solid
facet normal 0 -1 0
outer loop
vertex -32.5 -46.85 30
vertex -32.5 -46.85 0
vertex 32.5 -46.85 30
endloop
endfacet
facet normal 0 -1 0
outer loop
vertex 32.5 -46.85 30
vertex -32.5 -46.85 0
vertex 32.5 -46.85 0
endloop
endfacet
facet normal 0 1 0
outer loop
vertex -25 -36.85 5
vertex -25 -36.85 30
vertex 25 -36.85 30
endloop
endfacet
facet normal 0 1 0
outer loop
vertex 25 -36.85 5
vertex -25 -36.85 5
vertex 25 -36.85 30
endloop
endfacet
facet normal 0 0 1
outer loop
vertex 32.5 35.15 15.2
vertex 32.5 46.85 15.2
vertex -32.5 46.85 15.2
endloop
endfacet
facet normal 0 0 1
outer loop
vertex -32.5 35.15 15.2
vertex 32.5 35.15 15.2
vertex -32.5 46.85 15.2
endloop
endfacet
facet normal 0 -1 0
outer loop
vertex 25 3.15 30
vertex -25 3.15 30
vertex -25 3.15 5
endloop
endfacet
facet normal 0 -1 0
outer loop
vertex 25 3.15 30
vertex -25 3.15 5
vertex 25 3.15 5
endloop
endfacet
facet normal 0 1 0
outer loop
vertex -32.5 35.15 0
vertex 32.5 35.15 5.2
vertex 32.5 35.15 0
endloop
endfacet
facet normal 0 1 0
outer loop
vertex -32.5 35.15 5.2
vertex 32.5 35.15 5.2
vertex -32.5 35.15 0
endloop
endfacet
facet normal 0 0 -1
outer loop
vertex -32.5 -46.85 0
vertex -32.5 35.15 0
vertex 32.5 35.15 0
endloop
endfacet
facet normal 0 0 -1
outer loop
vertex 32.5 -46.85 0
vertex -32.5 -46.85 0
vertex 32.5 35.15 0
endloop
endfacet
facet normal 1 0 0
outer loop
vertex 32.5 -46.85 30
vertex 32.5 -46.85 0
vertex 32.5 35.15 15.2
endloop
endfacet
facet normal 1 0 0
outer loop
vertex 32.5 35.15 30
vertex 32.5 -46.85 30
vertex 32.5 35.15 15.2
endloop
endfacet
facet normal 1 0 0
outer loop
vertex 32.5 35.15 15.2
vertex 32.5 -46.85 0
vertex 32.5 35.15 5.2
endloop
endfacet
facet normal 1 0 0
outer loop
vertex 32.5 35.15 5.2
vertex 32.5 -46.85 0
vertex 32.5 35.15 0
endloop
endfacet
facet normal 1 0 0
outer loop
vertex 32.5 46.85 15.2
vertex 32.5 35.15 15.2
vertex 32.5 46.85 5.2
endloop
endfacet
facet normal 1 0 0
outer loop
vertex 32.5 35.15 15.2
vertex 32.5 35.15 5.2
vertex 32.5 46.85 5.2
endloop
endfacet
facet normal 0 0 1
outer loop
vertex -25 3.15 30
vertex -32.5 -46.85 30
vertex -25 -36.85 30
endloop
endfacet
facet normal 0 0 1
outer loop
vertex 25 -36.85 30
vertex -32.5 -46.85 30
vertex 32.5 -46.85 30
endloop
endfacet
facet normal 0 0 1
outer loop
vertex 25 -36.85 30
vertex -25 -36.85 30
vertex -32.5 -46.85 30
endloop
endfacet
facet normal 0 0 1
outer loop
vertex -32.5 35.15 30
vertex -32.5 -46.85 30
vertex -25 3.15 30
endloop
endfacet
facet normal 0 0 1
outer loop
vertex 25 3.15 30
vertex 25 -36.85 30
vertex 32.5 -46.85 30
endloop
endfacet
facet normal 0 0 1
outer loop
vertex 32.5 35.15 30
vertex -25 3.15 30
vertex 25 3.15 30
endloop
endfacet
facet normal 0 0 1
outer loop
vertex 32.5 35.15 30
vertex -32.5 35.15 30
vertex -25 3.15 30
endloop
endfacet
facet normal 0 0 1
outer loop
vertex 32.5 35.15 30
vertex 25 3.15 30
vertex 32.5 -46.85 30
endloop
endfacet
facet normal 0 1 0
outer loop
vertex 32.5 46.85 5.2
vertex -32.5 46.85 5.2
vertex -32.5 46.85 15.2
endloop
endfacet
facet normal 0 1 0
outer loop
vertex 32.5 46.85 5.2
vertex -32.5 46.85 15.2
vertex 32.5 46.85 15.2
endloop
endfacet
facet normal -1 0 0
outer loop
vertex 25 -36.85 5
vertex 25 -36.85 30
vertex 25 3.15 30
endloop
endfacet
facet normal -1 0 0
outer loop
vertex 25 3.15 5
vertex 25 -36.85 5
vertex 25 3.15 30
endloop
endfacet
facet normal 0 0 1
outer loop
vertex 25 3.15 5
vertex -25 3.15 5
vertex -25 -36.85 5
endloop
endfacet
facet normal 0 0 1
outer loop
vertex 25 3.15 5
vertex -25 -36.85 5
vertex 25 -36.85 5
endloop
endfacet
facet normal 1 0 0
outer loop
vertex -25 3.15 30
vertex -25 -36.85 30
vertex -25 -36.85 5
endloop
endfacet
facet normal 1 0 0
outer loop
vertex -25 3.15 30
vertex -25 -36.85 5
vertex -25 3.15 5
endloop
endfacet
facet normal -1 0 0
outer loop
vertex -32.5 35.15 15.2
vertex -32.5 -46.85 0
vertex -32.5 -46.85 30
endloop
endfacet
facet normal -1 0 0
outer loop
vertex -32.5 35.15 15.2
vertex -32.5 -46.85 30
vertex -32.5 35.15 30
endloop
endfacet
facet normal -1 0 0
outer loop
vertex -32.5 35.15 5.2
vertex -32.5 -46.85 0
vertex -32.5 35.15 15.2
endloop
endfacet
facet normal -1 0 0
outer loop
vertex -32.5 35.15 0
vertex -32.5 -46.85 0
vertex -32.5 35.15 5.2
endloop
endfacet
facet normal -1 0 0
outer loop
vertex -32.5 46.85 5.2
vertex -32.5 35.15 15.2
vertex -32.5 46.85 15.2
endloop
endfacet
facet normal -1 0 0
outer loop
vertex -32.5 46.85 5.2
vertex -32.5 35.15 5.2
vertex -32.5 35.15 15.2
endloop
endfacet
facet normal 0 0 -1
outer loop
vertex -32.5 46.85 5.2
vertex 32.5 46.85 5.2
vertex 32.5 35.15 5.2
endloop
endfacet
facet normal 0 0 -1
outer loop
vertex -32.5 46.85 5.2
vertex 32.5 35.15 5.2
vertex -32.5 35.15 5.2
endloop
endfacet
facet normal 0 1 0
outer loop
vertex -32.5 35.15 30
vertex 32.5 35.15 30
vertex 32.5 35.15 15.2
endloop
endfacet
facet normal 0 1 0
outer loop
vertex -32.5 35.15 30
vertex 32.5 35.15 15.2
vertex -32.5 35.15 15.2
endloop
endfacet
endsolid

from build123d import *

# Parameters (mm, degrees)
F0_W     = 65
F0_H     = 93.7
F1_DEPTH = 30
F2_W     = 65
F2_H     = 14.8
F3_DEPTH = 11.7
F4_W     = 65
F4_H     = 5.2
F5_DEPTH = 11.7
F6_W     = 50
F6_H     = 40
F7_DEPTH = 25


with BuildPart() as f1:
    # F0 (on Top) → F1 (new body)
    with BuildSketch(Plane.XY):
        Rectangle(F0_W, F0_H)
    extrude(amount=F1_DEPTH)

    # F2 (on face) → F3 (cut)
    with BuildSketch(Plane(origin=(0, 46.85, 0), x_dir=(-1, 0, 0), z_dir=(0, 1, 0))):
        with Locations((0, 22.6)):
            Rectangle(F2_W, F2_H)
    extrude(amount=-F3_DEPTH, mode=Mode.SUBTRACT)

    # F4 (on face) → F5 (cut)
    with BuildSketch(Plane(origin=(0, 46.85, 0), x_dir=(-1, 0, 0), z_dir=(0, 1, 0))):
        with Locations((0, 2.6)):
            Rectangle(F4_W, F4_H)
    extrude(amount=-F5_DEPTH, mode=Mode.SUBTRACT)

    # F6 (on face) → F7 (cut)
    with BuildSketch(Plane.XY.offset(30)):
        with Locations((0, -16.85)):
            Rectangle(F6_W, F6_H)
    extrude(amount=-F7_DEPTH, mode=Mode.SUBTRACT)


solid = f1.part
